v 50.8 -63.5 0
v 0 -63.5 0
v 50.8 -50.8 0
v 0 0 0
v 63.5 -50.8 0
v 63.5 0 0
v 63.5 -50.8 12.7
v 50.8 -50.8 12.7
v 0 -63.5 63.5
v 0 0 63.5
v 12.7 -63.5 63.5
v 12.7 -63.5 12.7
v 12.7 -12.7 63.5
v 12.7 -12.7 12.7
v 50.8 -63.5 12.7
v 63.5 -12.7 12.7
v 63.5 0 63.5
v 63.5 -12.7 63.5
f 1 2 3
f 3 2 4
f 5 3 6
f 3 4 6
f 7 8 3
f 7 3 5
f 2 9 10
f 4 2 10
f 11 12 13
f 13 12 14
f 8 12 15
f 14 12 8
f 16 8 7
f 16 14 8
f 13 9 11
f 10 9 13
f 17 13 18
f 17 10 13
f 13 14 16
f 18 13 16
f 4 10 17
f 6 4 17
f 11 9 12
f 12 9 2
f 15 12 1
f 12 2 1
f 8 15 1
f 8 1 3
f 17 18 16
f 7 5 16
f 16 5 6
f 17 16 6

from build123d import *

# Parameters (mm, degrees)
F0_W     = 63.5
F0_H     = 63.5
F1_DEPTH = 12.7
F2_W     = 63.5
F2_H     = 12.7
F3_DEPTH = 50.8
F4_W     = 12.7
F4_H     = 50.8
F5_DEPTH = 50.8
F6_W     = 12.7
F6_H     = 12.7
F7_DEPTH = 25.4


with BuildPart() as f1:
    # F0 (on Top) → F1 (new body)
    with BuildSketch(Plane.XY):
        with Locations((31.75, -31.75)):
            Rectangle(F0_W, F0_H)
    extrude(amount=F1_DEPTH)

    # F2 (on face) → F3 (join)
    with BuildSketch(Plane.XY.offset(12.7)):
        with Locations((31.75, -6.35)):
            Rectangle(F2_W, F2_H)
    extrude(amount=F3_DEPTH)

    # F4 (on face) → F5 (join)
    with BuildSketch(Plane.XY.offset(12.7)):
        with Locations((6.35, -38.1)):
            Rectangle(F4_W, F4_H)
    extrude(amount=F5_DEPTH)

    # F6 (on face) → F7 (cut)
    with BuildSketch(Plane.XY.offset(12.7)):
        with Locations((57.15, -57.15)):
            Rectangle(F6_W, F6_H)
    extrude(amount=-F7_DEPTH, mode=Mode.SUBTRACT)


solid = f1.part
